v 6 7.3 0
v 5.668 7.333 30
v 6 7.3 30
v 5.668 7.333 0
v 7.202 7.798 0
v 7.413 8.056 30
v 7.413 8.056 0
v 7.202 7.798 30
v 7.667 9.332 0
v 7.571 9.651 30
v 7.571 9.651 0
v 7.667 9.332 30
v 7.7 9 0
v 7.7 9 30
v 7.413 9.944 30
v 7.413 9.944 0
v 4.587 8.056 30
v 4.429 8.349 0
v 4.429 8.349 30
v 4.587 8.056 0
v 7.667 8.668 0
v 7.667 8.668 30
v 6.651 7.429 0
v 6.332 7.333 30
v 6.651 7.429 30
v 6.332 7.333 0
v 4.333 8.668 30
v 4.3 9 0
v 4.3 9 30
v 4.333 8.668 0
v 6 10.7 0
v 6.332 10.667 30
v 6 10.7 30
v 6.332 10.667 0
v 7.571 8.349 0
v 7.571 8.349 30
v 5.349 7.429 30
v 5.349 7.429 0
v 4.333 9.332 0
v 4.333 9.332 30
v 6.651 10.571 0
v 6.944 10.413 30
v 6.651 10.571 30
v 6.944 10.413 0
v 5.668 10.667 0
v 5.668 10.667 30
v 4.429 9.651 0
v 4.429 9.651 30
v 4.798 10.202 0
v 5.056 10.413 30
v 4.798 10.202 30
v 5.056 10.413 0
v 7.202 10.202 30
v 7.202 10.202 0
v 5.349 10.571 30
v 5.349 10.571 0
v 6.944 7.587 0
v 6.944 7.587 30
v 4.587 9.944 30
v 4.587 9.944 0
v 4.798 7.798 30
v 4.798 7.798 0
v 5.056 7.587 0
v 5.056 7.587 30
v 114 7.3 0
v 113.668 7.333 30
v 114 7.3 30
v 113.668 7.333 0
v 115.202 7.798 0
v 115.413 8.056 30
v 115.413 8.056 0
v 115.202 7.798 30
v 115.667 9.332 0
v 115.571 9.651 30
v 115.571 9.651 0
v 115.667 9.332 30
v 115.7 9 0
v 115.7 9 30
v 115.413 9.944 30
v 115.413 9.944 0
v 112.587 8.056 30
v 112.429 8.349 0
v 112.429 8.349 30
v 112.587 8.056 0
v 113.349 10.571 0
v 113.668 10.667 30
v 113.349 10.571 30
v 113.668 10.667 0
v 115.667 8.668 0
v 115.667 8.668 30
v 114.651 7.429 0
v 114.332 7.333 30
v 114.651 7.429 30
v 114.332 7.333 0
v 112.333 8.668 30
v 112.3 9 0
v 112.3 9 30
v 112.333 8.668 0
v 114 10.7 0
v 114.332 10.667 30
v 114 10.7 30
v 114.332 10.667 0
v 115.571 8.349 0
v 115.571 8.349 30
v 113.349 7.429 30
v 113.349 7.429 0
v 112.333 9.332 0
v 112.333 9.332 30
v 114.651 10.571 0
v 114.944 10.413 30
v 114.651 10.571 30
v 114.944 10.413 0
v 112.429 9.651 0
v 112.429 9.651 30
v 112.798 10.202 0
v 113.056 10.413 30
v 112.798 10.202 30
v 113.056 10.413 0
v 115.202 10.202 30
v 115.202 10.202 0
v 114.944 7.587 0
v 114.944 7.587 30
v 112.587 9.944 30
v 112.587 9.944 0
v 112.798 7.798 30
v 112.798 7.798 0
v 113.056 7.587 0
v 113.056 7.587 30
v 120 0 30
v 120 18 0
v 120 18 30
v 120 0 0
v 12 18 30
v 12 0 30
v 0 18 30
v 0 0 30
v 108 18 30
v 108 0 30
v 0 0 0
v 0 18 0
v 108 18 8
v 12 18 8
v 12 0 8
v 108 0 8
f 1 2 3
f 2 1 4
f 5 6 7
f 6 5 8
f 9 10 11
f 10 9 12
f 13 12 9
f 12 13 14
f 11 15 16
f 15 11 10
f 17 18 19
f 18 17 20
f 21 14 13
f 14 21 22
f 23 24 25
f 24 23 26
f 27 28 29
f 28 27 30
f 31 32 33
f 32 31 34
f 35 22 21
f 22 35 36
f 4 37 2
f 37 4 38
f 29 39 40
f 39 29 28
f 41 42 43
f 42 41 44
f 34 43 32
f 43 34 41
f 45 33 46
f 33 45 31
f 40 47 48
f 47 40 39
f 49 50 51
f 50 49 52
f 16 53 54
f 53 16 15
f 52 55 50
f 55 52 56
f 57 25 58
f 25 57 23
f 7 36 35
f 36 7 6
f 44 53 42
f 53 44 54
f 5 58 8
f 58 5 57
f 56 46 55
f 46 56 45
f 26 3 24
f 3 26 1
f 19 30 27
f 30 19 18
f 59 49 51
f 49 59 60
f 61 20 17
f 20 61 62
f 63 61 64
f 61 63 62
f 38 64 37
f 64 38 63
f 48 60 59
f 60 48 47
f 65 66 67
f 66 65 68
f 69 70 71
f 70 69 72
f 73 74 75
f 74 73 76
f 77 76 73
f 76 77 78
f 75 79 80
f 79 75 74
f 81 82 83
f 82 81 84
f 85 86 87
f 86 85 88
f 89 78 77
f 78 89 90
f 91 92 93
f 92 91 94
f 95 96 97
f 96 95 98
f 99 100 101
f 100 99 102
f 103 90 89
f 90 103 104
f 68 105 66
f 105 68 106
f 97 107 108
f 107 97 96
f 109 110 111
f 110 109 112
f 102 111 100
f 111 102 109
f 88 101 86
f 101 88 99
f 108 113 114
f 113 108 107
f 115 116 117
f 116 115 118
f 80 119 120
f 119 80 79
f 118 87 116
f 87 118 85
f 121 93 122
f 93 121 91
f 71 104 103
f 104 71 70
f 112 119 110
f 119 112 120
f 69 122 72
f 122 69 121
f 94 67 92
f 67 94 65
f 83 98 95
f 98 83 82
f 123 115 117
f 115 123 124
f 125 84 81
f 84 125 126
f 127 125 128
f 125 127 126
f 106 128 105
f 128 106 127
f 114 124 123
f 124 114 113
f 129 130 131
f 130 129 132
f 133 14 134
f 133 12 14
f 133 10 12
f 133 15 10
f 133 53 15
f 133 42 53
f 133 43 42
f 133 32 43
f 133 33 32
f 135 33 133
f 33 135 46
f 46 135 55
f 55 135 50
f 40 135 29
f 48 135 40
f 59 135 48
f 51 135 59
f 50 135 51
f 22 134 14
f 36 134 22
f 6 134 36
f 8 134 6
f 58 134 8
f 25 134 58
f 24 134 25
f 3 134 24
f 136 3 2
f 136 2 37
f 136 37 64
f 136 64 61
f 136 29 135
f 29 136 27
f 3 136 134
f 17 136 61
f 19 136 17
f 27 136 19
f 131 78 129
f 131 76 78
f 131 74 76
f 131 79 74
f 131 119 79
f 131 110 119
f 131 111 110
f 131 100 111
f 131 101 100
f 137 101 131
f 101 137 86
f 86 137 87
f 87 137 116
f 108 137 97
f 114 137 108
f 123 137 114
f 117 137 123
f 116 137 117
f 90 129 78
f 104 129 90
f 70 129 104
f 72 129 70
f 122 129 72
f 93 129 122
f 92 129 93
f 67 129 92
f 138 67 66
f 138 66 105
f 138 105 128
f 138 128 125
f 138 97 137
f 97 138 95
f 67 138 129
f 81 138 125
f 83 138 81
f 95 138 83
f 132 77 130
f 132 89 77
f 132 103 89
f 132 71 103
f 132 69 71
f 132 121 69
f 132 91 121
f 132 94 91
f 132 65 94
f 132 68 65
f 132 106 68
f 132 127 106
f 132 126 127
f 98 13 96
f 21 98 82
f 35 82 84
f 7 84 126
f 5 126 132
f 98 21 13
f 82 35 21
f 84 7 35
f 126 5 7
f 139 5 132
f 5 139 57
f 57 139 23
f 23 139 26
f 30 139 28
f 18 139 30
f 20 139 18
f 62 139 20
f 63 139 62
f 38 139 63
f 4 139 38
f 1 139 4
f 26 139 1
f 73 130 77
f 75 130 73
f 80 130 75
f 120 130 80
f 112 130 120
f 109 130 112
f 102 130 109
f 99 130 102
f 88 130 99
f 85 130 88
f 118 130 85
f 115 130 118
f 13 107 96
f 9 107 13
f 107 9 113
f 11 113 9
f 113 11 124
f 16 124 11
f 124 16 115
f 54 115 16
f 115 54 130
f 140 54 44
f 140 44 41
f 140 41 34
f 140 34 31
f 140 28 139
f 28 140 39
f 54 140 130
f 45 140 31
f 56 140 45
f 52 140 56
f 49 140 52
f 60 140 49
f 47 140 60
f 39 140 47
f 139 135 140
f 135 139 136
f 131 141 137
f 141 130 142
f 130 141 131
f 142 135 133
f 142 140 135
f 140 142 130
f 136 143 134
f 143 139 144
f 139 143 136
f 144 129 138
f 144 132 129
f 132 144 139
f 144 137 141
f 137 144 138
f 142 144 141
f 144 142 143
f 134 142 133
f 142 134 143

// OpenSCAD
// ModuDeck donor chassis study: NOT a verified ThinkPad fit.
// Millimetres. 370x240 is an unconfirmed owner measurement.
$fn=32; W=370; D=240; t=3;
module plate(w,d,h){cube([w,d,h]);}
module shell(w,d,h){difference(){cube([w,d,h]);translate([t,t,t])cube([w-2*t,d-2*t,h]);}}
module hole(x,y,h){translate([x,y,-1])cylinder(d=3.4,h=h+2);}
module rail(n){difference(){cube([n,12,6]);for(x=[10:20:n-10])hole(x,6,6);}}
module rear(){difference(){cube([W-6,3,25]);translate([W/2-23,-1,6])cube([40,5,14]);for(x=[10,W-16])translate([x,-1,12])rotate([-90,0,0])cylinder(d=3.4,h=5);}}
module tray(){difference(){shell(W,D,30);translate([3,D-4,3])cube([W-6,6,27]);for(x=[15,W-15],y=[15,D-15])hole(x,y,30);}}
difference(){cube([120,18,30]);translate([12,-1,8])cube([96,20,23]);for(x=[6,114])hole(x,9,30);}
